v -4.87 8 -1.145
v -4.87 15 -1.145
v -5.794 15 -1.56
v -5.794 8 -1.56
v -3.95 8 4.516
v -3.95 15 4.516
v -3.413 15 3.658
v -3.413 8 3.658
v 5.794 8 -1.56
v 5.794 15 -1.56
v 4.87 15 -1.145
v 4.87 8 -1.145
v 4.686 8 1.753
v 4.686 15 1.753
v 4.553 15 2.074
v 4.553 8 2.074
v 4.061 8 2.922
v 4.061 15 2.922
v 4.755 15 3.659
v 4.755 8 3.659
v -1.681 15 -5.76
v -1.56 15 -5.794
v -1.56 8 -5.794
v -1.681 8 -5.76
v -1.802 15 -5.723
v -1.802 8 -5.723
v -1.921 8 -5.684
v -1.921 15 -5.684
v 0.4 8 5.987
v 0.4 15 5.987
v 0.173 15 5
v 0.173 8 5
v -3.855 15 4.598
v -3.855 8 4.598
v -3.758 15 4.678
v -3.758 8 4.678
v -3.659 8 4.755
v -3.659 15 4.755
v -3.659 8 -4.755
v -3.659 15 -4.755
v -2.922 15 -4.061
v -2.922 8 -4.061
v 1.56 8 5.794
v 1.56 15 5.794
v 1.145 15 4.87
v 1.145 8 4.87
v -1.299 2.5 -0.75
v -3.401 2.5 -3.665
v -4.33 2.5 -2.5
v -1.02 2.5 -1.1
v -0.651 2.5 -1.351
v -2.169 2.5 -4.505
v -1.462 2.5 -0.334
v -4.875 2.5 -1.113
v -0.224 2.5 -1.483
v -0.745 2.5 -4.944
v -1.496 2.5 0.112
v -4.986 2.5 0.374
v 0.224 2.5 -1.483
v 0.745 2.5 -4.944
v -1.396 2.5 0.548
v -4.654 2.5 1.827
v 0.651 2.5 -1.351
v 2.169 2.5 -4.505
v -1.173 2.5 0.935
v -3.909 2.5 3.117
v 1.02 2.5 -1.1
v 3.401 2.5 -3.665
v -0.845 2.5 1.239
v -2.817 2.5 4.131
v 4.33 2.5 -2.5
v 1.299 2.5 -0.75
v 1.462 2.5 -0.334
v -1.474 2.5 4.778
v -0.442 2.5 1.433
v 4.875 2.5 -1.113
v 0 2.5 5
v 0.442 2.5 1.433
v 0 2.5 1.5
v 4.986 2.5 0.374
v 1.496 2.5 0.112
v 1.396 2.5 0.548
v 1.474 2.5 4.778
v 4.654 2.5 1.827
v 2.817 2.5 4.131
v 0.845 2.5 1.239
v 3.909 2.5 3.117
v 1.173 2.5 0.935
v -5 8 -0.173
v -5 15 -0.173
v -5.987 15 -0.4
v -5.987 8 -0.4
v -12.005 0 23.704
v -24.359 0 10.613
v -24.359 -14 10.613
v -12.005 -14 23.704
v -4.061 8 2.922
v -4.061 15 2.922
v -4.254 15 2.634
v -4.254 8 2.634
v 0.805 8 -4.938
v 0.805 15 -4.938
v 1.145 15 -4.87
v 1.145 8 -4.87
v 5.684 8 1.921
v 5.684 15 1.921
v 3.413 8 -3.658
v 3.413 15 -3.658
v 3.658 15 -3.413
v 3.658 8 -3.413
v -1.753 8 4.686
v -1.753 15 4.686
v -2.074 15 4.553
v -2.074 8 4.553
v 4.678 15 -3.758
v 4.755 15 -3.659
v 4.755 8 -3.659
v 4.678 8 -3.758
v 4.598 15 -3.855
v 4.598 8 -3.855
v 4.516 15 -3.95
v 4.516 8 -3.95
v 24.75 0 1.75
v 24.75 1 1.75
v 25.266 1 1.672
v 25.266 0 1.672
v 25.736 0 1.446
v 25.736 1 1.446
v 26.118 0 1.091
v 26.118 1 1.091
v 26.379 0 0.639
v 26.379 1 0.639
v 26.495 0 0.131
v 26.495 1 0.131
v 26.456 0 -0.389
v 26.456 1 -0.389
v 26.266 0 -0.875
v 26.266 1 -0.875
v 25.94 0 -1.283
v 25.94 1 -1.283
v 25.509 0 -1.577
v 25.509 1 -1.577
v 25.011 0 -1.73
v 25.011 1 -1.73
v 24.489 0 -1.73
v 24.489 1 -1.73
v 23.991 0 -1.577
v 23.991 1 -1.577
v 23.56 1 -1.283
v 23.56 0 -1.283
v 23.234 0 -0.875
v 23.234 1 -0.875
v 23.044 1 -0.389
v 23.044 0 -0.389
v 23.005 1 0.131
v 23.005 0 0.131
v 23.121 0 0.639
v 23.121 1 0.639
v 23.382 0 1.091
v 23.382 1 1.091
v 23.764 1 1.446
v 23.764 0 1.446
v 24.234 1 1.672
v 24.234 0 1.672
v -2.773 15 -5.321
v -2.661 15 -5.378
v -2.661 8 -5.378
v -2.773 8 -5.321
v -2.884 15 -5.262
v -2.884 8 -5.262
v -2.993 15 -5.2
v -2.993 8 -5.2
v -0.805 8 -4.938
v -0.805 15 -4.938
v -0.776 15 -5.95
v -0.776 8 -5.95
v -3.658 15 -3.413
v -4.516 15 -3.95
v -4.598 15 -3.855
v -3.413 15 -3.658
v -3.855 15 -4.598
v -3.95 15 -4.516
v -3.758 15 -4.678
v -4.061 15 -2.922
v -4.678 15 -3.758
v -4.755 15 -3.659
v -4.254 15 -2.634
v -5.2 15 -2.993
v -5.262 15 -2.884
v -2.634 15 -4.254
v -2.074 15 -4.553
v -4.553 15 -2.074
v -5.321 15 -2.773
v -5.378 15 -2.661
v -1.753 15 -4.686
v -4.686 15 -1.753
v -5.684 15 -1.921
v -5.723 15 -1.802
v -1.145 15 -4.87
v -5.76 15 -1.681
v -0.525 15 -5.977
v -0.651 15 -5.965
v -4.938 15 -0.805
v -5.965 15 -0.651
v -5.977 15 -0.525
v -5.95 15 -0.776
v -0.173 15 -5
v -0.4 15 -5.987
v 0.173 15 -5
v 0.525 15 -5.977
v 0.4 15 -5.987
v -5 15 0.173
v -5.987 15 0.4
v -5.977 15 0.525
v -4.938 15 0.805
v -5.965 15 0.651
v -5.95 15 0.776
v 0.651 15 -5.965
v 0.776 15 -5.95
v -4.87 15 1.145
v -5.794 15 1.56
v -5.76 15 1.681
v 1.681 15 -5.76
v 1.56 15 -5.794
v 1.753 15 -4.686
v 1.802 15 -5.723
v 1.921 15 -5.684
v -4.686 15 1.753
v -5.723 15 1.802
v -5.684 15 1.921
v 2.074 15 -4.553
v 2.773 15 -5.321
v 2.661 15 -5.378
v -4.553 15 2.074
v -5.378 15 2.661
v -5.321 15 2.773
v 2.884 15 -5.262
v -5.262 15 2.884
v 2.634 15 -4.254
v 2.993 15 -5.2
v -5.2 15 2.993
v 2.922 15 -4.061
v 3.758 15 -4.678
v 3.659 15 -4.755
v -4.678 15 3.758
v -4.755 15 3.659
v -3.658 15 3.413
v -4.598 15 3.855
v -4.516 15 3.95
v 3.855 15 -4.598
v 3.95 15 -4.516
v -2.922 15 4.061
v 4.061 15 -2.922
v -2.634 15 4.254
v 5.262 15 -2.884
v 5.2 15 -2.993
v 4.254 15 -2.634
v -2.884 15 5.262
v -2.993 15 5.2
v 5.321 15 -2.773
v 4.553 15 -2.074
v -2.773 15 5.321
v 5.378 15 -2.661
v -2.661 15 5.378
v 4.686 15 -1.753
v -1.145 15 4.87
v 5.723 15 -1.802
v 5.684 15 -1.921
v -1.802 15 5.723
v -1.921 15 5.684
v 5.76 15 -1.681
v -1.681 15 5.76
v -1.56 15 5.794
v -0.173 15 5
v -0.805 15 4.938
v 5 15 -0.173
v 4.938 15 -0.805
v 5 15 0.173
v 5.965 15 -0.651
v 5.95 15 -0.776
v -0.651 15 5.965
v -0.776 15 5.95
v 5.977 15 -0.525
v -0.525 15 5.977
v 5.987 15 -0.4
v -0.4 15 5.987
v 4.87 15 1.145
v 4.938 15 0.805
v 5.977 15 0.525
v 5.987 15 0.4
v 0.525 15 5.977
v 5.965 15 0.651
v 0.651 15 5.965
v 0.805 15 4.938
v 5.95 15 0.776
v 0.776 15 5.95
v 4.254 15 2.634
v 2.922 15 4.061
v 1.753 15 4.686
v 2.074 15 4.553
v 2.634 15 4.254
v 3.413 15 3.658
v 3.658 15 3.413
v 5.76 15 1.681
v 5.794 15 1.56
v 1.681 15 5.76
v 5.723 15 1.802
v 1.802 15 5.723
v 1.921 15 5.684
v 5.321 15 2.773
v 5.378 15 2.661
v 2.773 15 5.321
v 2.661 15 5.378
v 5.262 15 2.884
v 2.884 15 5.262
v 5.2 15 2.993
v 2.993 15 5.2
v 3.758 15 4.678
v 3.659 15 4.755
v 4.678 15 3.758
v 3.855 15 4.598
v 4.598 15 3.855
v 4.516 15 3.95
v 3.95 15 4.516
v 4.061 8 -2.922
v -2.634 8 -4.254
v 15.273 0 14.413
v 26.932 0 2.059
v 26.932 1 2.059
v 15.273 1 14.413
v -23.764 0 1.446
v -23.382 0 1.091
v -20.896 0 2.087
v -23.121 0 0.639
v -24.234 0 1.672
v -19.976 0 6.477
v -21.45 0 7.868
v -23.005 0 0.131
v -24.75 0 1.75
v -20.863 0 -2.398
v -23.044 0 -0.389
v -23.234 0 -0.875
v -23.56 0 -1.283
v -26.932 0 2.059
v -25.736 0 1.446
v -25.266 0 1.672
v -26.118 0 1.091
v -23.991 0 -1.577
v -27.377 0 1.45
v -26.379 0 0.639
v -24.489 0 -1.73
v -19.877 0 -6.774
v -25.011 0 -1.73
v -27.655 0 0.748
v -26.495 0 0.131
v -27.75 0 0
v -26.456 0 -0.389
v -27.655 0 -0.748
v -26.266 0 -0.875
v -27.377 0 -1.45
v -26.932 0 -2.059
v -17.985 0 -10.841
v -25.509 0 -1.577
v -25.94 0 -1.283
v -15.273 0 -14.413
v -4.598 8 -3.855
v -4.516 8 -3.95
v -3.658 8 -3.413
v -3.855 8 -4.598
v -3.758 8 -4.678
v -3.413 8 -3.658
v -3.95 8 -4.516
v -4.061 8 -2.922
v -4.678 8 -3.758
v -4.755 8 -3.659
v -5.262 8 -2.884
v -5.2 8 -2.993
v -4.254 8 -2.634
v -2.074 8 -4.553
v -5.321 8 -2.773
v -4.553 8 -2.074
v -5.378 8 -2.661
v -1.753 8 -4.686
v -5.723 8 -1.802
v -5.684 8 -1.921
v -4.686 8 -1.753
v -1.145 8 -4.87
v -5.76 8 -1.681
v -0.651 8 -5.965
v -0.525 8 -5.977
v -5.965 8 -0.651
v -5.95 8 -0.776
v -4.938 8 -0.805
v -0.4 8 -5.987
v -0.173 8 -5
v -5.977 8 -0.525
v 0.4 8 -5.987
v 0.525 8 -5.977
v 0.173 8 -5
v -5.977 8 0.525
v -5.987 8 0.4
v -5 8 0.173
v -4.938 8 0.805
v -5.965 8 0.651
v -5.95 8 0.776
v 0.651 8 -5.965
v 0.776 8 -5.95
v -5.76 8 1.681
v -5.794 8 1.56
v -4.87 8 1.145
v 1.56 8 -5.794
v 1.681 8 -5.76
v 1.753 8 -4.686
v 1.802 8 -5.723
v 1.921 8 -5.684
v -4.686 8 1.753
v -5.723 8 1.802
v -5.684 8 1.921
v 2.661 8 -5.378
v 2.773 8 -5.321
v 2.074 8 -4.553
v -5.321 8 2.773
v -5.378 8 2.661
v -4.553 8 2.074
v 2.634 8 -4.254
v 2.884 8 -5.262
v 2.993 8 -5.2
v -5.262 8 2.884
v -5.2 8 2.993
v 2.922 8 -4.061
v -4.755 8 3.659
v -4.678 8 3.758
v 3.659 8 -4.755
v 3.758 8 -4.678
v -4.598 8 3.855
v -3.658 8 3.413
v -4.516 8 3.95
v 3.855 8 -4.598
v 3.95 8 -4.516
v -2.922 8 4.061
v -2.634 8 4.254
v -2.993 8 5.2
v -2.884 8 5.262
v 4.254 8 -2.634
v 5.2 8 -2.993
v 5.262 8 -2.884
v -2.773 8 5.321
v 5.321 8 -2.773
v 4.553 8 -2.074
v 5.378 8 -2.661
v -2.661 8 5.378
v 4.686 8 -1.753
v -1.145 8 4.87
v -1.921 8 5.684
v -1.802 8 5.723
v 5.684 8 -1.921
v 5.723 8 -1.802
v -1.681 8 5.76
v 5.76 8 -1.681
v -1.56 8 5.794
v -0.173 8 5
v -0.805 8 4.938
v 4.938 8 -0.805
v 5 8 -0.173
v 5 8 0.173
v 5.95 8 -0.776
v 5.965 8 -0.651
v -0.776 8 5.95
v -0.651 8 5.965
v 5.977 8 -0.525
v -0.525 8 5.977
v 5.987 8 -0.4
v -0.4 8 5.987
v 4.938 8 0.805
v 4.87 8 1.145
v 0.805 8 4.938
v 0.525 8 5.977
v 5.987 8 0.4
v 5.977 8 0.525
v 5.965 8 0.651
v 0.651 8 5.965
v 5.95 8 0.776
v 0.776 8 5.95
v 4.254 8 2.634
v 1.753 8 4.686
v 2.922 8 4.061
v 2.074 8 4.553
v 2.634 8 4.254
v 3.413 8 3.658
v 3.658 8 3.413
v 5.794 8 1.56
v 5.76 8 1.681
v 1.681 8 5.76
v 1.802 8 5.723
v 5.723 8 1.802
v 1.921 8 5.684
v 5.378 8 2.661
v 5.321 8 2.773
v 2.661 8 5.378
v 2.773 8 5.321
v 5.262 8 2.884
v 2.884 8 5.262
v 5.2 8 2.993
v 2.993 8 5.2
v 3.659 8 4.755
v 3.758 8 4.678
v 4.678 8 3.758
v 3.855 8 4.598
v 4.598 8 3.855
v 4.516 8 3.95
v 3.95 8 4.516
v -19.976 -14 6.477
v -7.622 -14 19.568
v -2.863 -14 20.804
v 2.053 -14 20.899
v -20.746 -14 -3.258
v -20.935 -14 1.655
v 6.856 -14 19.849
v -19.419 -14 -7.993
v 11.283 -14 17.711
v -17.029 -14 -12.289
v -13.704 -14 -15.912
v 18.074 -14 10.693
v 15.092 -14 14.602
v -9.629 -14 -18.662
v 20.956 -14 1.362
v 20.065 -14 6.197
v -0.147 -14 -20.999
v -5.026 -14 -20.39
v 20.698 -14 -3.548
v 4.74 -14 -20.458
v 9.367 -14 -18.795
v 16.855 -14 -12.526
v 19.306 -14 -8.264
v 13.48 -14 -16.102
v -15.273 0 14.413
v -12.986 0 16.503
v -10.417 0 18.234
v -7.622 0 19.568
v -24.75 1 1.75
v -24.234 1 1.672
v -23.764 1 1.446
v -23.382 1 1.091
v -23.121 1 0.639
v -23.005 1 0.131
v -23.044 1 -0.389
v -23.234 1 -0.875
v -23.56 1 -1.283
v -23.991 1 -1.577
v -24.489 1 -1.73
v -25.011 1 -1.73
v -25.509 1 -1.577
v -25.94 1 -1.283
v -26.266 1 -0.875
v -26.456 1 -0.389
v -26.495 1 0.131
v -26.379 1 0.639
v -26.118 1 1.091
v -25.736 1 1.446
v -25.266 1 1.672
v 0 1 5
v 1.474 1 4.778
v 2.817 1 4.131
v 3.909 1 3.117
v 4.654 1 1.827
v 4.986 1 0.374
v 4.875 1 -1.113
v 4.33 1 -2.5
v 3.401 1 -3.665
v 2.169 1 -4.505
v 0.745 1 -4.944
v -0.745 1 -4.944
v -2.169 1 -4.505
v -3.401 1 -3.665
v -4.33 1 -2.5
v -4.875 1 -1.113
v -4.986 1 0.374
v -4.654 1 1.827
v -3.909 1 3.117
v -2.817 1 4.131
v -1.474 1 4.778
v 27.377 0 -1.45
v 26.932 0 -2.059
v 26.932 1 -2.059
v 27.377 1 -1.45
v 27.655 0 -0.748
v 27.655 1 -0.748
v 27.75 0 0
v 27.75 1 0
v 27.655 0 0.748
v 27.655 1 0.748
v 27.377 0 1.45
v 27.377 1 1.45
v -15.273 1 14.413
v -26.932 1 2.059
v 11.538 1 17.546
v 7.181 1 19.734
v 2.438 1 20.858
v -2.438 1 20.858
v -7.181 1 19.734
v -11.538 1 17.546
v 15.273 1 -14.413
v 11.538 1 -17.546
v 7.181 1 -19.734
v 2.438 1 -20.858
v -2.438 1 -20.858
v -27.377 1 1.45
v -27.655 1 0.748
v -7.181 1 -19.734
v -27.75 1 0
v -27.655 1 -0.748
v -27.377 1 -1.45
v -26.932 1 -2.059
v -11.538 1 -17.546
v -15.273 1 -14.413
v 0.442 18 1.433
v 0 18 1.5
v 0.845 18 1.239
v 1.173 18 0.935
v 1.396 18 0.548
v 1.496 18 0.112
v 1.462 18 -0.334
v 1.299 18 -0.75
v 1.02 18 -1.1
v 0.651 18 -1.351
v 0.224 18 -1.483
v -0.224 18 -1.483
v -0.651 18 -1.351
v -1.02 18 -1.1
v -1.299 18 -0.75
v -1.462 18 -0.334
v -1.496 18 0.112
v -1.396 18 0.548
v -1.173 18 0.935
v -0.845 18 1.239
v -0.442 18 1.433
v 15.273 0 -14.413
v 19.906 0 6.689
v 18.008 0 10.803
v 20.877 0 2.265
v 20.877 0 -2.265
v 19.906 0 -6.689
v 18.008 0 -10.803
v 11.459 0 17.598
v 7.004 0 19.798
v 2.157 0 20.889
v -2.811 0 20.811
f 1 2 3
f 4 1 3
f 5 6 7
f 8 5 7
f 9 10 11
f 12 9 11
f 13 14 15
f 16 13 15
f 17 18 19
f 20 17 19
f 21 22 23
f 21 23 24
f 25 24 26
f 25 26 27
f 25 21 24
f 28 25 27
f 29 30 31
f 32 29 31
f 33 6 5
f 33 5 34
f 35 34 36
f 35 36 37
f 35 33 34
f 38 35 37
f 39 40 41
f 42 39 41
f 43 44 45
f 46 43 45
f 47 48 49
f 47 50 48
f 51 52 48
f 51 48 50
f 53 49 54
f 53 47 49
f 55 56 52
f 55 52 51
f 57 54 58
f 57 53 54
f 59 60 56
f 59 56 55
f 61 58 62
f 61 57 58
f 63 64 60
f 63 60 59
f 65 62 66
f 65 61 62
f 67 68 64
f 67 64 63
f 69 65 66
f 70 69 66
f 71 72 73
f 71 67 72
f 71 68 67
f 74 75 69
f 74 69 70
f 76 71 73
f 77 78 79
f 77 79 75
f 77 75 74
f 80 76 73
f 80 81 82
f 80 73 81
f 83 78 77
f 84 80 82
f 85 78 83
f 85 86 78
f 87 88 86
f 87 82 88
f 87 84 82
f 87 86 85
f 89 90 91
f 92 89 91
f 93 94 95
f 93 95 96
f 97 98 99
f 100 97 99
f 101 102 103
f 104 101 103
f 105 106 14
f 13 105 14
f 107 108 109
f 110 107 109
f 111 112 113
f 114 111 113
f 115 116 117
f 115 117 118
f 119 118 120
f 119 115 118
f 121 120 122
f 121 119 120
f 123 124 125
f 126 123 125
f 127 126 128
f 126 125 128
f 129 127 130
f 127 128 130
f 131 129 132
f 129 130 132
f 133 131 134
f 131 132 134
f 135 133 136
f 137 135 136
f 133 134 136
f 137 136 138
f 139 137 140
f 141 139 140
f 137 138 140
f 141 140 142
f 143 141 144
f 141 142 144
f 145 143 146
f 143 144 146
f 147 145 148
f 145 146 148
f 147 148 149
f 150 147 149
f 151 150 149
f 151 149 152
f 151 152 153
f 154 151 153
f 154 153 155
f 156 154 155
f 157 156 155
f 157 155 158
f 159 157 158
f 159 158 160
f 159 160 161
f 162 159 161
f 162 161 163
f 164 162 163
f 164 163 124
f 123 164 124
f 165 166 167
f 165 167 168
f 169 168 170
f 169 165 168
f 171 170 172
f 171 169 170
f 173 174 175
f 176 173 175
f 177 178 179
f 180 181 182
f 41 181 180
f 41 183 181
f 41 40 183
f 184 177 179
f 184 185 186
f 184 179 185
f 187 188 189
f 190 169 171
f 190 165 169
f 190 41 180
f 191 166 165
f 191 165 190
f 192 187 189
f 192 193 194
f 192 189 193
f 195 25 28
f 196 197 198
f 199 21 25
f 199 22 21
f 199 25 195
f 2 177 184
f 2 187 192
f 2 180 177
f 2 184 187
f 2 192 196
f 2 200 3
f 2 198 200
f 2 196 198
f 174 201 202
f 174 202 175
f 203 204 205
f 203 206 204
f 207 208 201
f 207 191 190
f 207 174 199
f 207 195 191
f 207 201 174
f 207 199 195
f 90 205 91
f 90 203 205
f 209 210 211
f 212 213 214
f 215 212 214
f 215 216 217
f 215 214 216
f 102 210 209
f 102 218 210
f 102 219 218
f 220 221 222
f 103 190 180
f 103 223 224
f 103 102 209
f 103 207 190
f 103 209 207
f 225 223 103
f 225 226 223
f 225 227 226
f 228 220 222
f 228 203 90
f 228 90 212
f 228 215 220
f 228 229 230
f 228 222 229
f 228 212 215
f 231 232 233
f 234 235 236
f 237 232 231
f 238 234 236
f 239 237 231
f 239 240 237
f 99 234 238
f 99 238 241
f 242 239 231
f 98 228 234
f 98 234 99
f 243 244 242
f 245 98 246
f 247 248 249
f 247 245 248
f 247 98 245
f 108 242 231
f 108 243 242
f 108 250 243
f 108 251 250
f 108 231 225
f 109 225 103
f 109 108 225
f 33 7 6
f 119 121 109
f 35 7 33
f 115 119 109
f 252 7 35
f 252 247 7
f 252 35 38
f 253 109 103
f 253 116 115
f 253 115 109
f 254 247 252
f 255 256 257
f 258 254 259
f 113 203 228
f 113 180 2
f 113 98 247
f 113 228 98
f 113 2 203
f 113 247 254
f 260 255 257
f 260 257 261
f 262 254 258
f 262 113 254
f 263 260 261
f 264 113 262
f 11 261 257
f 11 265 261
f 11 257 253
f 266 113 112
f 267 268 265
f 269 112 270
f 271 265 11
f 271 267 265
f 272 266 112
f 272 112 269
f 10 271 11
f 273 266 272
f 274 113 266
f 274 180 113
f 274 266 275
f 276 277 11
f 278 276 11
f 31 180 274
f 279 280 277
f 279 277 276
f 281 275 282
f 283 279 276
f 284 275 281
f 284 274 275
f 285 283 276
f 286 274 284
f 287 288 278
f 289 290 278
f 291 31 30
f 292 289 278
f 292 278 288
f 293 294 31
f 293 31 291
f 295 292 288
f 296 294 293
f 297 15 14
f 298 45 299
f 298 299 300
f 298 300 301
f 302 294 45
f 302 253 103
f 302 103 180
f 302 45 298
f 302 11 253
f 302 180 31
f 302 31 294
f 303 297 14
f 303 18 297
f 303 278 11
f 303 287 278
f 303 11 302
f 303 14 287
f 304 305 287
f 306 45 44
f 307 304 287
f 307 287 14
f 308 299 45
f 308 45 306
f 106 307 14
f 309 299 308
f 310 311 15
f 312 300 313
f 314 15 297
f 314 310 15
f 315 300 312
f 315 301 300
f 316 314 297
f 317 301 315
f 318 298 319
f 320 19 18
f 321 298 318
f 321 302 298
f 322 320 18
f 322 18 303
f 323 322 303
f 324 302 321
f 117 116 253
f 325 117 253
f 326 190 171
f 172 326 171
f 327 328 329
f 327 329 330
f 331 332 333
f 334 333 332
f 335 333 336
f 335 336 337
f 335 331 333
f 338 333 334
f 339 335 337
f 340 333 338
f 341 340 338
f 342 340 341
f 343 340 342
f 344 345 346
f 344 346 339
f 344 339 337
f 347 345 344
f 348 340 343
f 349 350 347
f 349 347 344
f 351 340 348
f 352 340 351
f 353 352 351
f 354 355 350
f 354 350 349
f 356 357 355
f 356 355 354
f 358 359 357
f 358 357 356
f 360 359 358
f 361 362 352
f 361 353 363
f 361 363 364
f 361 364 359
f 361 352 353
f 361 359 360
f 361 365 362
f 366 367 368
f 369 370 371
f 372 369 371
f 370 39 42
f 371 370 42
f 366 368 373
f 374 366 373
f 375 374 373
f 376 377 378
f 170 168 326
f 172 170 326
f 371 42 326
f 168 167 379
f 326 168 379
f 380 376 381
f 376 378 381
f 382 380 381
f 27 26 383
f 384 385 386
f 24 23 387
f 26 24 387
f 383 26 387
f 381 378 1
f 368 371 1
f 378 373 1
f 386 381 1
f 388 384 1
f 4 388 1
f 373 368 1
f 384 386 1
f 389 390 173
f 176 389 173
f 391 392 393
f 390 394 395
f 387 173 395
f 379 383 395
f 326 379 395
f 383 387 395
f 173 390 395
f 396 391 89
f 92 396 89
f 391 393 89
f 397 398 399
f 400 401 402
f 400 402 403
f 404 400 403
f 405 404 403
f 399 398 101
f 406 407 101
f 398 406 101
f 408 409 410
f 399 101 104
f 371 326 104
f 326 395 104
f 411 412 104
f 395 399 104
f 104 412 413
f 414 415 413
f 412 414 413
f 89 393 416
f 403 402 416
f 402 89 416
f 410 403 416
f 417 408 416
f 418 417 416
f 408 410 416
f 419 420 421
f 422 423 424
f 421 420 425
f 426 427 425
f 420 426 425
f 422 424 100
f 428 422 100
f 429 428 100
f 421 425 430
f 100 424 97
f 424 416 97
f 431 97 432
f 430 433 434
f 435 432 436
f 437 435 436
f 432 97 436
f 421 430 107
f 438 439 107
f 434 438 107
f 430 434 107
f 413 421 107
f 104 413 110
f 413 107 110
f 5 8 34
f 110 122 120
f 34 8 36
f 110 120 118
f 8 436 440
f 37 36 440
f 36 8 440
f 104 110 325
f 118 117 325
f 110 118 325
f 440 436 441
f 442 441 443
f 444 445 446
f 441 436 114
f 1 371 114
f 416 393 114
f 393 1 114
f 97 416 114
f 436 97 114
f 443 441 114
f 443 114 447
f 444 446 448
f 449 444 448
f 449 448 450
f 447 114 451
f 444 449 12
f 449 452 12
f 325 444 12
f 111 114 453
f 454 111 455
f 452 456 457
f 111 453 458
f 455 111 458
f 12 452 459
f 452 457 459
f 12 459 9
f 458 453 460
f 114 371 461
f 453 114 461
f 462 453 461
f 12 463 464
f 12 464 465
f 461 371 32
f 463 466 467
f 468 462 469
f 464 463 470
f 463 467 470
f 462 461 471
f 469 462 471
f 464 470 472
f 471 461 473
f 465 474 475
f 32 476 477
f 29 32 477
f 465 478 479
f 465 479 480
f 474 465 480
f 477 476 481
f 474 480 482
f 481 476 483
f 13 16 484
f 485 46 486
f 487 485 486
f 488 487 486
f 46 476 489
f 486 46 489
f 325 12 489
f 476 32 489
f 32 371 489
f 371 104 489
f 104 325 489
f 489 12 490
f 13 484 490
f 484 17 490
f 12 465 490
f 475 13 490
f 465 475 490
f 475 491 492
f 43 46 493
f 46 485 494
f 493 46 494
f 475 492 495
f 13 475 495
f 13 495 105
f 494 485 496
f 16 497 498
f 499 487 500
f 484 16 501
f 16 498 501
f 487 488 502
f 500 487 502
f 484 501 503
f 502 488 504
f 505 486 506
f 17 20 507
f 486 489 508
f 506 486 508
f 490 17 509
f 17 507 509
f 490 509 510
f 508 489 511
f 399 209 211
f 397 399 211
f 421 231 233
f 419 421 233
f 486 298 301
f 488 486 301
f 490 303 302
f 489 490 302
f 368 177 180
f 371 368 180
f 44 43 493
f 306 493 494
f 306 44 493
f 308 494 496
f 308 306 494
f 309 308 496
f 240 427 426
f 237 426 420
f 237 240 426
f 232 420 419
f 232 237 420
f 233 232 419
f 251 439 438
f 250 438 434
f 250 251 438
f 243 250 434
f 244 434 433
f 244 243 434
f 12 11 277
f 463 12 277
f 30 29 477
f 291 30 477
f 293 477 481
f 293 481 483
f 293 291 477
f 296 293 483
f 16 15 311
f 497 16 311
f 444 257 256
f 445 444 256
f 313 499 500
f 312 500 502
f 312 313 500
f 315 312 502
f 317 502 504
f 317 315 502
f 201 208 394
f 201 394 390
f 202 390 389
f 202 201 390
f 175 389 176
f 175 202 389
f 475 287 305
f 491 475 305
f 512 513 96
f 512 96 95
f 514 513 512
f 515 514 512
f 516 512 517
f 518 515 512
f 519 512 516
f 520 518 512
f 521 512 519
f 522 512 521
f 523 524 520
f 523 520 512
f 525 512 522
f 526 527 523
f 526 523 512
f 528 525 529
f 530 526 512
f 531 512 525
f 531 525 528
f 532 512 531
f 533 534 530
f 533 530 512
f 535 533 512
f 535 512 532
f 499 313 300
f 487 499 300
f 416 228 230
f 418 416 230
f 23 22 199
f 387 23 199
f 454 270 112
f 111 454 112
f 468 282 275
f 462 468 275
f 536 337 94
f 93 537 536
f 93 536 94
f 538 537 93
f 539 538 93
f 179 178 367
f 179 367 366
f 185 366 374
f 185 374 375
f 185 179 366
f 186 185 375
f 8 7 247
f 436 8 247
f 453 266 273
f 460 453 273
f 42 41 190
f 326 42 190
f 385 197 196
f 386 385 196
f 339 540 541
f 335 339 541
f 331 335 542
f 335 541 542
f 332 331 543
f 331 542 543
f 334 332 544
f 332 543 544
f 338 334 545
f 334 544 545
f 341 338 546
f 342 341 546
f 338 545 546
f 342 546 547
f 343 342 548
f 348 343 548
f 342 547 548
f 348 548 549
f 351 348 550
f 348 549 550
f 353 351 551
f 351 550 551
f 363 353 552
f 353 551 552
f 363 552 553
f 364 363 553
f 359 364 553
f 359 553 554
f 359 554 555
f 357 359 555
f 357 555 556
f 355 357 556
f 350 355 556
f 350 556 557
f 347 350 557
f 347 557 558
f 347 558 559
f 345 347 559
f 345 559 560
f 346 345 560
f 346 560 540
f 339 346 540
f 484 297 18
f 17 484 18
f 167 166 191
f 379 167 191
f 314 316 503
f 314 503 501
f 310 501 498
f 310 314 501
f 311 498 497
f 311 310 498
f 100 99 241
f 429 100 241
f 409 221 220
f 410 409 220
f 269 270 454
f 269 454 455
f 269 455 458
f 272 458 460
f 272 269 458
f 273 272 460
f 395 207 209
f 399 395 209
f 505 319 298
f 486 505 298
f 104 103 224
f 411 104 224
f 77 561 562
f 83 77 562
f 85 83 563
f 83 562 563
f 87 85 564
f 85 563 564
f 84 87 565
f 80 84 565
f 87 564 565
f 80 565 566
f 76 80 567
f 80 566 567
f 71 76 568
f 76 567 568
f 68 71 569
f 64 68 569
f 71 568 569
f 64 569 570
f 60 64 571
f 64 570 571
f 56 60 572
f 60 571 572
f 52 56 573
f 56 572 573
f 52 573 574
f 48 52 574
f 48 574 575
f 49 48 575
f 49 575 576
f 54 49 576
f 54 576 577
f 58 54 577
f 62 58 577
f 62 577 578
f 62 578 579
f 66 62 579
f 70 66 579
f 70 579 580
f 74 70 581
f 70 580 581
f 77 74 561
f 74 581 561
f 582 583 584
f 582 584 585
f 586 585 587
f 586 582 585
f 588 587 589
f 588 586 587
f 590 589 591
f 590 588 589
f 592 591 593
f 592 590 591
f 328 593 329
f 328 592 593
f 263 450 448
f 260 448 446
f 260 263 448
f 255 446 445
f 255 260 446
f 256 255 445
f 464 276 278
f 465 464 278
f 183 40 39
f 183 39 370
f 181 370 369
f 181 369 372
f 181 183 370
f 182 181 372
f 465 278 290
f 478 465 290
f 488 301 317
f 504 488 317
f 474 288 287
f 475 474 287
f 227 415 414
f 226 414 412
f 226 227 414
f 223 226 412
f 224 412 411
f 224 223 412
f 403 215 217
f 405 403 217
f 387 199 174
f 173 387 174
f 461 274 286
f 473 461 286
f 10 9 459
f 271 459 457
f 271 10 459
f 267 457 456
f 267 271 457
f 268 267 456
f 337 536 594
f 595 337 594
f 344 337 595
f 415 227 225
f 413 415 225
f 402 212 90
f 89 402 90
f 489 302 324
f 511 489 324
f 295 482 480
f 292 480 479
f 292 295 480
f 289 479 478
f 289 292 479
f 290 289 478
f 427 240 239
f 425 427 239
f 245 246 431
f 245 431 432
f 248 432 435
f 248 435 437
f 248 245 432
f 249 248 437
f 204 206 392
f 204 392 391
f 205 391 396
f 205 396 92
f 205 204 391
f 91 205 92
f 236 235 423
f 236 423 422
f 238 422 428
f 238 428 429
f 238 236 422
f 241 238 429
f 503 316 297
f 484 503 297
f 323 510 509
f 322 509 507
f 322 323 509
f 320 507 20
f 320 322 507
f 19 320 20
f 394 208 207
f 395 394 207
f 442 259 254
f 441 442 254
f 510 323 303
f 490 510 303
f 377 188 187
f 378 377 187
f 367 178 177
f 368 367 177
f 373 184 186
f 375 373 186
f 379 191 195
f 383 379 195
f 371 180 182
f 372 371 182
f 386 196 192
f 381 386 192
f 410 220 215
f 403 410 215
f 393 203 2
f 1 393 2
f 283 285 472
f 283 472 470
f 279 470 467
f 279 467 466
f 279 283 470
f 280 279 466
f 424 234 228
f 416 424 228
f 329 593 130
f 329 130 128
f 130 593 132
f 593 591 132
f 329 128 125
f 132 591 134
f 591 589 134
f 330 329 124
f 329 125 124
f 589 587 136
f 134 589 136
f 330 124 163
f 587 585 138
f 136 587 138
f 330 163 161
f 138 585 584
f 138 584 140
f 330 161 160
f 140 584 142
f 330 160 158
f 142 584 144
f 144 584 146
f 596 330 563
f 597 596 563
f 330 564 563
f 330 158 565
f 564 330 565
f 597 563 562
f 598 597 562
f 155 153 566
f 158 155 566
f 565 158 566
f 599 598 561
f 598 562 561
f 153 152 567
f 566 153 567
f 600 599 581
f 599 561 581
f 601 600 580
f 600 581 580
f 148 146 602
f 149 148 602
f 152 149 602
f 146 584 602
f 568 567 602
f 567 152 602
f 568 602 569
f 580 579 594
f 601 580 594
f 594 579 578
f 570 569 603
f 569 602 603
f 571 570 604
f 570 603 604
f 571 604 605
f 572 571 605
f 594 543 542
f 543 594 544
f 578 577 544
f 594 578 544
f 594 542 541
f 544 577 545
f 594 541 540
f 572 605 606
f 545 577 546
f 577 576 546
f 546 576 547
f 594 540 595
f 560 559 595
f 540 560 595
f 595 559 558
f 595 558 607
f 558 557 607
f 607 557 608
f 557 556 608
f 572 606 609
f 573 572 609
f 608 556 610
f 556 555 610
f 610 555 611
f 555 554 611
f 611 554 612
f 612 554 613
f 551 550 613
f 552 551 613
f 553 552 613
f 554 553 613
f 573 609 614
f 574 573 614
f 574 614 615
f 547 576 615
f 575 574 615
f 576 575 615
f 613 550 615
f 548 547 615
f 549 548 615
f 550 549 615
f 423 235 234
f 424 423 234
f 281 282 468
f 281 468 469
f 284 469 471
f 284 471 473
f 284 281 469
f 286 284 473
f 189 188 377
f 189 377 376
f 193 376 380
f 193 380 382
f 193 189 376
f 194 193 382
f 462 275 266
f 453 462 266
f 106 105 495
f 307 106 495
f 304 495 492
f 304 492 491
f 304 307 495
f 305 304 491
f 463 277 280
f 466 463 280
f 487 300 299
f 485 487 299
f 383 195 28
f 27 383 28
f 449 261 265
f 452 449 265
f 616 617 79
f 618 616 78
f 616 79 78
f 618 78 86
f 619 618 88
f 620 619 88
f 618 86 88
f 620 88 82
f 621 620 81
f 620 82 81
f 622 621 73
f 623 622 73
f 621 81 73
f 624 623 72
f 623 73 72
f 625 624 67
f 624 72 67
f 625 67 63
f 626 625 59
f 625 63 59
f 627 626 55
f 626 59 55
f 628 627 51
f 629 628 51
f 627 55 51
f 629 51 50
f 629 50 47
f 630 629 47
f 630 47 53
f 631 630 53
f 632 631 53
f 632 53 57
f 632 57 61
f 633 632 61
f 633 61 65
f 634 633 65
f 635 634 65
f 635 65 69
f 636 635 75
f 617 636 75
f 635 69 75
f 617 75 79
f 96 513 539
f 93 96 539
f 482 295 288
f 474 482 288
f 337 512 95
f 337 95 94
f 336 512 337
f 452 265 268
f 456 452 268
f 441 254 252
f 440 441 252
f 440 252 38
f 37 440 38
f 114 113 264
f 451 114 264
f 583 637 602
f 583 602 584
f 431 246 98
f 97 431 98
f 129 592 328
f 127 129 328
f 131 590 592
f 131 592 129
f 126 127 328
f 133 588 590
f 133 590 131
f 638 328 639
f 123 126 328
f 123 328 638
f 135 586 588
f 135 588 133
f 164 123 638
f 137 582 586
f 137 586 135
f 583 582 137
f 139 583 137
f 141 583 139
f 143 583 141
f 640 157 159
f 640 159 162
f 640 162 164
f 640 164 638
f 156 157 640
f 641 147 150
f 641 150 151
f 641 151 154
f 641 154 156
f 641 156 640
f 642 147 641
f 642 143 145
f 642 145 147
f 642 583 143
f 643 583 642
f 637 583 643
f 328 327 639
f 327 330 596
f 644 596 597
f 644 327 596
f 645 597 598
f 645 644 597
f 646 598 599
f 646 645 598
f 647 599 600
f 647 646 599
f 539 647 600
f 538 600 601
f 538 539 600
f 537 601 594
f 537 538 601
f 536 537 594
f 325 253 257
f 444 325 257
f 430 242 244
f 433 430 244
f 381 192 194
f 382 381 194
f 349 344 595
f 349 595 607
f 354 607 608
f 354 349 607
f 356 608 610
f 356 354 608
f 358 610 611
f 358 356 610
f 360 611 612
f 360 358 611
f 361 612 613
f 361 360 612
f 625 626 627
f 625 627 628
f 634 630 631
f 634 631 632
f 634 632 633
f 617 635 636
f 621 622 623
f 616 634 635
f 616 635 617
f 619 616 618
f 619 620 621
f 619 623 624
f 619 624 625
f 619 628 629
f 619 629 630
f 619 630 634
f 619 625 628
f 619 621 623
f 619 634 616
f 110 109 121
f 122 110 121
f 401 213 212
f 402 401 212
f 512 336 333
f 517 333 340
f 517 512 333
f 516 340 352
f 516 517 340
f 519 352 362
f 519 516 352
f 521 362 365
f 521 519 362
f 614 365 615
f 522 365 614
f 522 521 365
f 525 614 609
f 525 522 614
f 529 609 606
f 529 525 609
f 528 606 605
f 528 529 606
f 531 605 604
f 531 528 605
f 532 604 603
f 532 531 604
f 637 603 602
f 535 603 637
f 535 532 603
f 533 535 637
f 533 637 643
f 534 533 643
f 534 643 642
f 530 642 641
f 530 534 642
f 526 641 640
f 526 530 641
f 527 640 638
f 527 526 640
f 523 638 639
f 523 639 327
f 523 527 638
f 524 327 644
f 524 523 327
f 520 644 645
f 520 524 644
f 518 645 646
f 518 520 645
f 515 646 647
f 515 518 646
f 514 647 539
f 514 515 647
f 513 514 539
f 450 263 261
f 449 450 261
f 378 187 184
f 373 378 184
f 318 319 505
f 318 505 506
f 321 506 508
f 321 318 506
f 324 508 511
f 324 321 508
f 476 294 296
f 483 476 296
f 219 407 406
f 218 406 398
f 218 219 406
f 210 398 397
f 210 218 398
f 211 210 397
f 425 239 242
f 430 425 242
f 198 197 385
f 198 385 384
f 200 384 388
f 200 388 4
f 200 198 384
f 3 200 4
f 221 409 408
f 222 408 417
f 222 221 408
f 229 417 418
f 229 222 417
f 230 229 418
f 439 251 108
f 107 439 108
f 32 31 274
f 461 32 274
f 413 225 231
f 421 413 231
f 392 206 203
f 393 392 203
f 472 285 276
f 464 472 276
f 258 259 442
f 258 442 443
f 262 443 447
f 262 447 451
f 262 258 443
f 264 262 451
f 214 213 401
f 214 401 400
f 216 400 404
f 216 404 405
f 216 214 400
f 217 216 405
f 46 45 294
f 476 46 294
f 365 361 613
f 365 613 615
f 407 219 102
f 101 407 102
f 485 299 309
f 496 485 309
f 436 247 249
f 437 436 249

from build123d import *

# Parameters (mm, degrees)
EXTRUDE_1_DEPTH          = 1
EXTRUDE_START            = 14
SKETCH_2_R               = 21
EXTRUDE_2_DEPTH          = 14
EXTRUDE_3_DEPTH          = 4
EXTRUDE_3_DEPTH_BACK     = 14
SKETCH_3_W               = 18
SKETCH_3_H               = 14
SKETCH_4_R               = 1.75
CUT_EXTRUDE_1_DEPTH      = 4
SKETCH_5_R               = 5
EXTRUDE_4_DEPTH          = 1.5
SKETCH_6_R               = 1.5
EXTRUDE_5_DEPTH          = 15.5
SKETCH_8_R               = 6
EXTRUDE_6_DEPTH          = 7
CUT_EXTRUDE_2_DEPTH      = 7
PATTERN_CIRCULAR_1_COUNT = 32


with BuildPart() as part:
    # 스케치1 → 보스-돌출1 (new body)
    with BuildSketch(Plane(origin=(0, 0, 0), x_dir=(1, 0, 0), z_dir=(0, 1, 0))):
        with BuildLine():
            Line((15.272727273, 14.413320286), (26.931818182, 2.059045755))
            ThreePointArc((26.931818182, 2.059045755), (27.75, 0), (26.931818182, -2.059045755))
            Line((26.931818182, -2.059045755), (15.272727273, -14.413320286))
            ThreePointArc((15.272727273, -14.413320286), (0, -21), (-15.272727273, -14.413320286))
            Line((-15.272727273, -14.413320286), (-26.931818182, -2.059045755))
            ThreePointArc((-26.931818182, -2.059045755), (-27.75, 0), (-26.931818182, 2.059045755))
            Line((-26.931818182, 2.059045755), (-15.272727273, 14.413320286))
            ThreePointArc((-15.272727273, 14.413320286), (0, 21), (15.272727273, 14.413320286))
        make_face()
    extrude(amount=EXTRUDE_1_DEPTH)

    # 스케치2 → 보스-돌출2 (add)
    with BuildSketch(Plane.XZ.offset(EXTRUDE_START)):
        with Locations(Location((0, 0, 0), (0, 0, 270))):
            Circle(SKETCH_2_R)
    extrude(amount=-EXTRUDE_2_DEPTH)

    # 스케치3 → 보스-돌출3 (add, two sides: drawn at the far end of the back side and taken through both)
    with BuildSketch(Plane(origin=(-15.272727273, 0, 14.413320286), x_dir=(0.6863485850246138, 0, 0.7272727272727271), z_dir=(-0.7272727272727271, 0, 0.6863485850246138)).offset(-EXTRUDE_3_DEPTH_BACK)):
        with Locations((0, -7)):
            Rectangle(SKETCH_3_W, SKETCH_3_H)
    extrude(amount=EXTRUDE_3_DEPTH + EXTRUDE_3_DEPTH_BACK)

    # 스케치4 → 컷-돌출1 (cut)
    with BuildSketch(Plane(origin=(0, 1, 0), x_dir=(1, 0, 0), z_dir=(0, 1, 0))):
        with Locations(Location((24.75, 0, 0), (0, 0, 270))):
            Circle(SKETCH_4_R)
        with Locations(Location((-24.75, 0, 0), (0, 0, 270))):
            Circle(SKETCH_4_R)
    extrude(amount=-CUT_EXTRUDE_1_DEPTH, mode=Mode.SUBTRACT)

    # 스케치5 → 보스-돌출4 (add)
    with BuildSketch(Plane(origin=(0, 1, 0), x_dir=(1, 0, 0), z_dir=(0, 1, 0))):
        with Locations(Location((0, 0, 0), (0, 0, 270))):
            Circle(SKETCH_5_R)
    extrude(amount=EXTRUDE_4_DEPTH)

    # 스케치6 → 보스-돌출5 (add)
    with BuildSketch(Plane(origin=(0, 2.5, 0), x_dir=(1, 0, 0), z_dir=(0, 1, 0))):
        with Locations(Location((0, 0, 0), (0, 0, 270))):
            Circle(SKETCH_6_R)
    extrude(amount=EXTRUDE_5_DEPTH)


with BuildPart() as body_2:
    # 스케치8 → 보스-돌출6 (new body)
    with BuildSketch(Plane(origin=(0, 15, 0), x_dir=(1, 0, 0), z_dir=(0, 1, 0))):
        with Locations(Location((0, 0, 0), (0, 0, 270))):
            Circle(SKETCH_8_R)
    extrude(amount=-EXTRUDE_6_DEPTH)

    # 스케치9 → 컷-돌출2 (cut)
    with BuildSketch(Plane(origin=(0, 15, 0), x_dir=(1, 0, 0), z_dir=(0, 1, 0))):
        Polygon((0, 5), (0.173304385, 5), (0.4, 5.986651819), (0, 6.45389359), (-0.4, 5.986651819), (-0.173304385, 5), align=None)
    cut_extrude_2 = extrude(amount=-CUT_EXTRUDE_2_DEPTH, mode=Mode.SUBTRACT)

    # 원형 패턴1: 컷-돌출2 ×32 about axis
    pattern_circular_1_axis = Axis((0, 0, 0), (0, 1, 0))
    for i in range(1, PATTERN_CIRCULAR_1_COUNT):
        add(cut_extrude_2.rotate(pattern_circular_1_axis, i * 360 / PATTERN_CIRCULAR_1_COUNT), mode=Mode.SUBTRACT)


solid = Compound([part.part, body_2.part])
